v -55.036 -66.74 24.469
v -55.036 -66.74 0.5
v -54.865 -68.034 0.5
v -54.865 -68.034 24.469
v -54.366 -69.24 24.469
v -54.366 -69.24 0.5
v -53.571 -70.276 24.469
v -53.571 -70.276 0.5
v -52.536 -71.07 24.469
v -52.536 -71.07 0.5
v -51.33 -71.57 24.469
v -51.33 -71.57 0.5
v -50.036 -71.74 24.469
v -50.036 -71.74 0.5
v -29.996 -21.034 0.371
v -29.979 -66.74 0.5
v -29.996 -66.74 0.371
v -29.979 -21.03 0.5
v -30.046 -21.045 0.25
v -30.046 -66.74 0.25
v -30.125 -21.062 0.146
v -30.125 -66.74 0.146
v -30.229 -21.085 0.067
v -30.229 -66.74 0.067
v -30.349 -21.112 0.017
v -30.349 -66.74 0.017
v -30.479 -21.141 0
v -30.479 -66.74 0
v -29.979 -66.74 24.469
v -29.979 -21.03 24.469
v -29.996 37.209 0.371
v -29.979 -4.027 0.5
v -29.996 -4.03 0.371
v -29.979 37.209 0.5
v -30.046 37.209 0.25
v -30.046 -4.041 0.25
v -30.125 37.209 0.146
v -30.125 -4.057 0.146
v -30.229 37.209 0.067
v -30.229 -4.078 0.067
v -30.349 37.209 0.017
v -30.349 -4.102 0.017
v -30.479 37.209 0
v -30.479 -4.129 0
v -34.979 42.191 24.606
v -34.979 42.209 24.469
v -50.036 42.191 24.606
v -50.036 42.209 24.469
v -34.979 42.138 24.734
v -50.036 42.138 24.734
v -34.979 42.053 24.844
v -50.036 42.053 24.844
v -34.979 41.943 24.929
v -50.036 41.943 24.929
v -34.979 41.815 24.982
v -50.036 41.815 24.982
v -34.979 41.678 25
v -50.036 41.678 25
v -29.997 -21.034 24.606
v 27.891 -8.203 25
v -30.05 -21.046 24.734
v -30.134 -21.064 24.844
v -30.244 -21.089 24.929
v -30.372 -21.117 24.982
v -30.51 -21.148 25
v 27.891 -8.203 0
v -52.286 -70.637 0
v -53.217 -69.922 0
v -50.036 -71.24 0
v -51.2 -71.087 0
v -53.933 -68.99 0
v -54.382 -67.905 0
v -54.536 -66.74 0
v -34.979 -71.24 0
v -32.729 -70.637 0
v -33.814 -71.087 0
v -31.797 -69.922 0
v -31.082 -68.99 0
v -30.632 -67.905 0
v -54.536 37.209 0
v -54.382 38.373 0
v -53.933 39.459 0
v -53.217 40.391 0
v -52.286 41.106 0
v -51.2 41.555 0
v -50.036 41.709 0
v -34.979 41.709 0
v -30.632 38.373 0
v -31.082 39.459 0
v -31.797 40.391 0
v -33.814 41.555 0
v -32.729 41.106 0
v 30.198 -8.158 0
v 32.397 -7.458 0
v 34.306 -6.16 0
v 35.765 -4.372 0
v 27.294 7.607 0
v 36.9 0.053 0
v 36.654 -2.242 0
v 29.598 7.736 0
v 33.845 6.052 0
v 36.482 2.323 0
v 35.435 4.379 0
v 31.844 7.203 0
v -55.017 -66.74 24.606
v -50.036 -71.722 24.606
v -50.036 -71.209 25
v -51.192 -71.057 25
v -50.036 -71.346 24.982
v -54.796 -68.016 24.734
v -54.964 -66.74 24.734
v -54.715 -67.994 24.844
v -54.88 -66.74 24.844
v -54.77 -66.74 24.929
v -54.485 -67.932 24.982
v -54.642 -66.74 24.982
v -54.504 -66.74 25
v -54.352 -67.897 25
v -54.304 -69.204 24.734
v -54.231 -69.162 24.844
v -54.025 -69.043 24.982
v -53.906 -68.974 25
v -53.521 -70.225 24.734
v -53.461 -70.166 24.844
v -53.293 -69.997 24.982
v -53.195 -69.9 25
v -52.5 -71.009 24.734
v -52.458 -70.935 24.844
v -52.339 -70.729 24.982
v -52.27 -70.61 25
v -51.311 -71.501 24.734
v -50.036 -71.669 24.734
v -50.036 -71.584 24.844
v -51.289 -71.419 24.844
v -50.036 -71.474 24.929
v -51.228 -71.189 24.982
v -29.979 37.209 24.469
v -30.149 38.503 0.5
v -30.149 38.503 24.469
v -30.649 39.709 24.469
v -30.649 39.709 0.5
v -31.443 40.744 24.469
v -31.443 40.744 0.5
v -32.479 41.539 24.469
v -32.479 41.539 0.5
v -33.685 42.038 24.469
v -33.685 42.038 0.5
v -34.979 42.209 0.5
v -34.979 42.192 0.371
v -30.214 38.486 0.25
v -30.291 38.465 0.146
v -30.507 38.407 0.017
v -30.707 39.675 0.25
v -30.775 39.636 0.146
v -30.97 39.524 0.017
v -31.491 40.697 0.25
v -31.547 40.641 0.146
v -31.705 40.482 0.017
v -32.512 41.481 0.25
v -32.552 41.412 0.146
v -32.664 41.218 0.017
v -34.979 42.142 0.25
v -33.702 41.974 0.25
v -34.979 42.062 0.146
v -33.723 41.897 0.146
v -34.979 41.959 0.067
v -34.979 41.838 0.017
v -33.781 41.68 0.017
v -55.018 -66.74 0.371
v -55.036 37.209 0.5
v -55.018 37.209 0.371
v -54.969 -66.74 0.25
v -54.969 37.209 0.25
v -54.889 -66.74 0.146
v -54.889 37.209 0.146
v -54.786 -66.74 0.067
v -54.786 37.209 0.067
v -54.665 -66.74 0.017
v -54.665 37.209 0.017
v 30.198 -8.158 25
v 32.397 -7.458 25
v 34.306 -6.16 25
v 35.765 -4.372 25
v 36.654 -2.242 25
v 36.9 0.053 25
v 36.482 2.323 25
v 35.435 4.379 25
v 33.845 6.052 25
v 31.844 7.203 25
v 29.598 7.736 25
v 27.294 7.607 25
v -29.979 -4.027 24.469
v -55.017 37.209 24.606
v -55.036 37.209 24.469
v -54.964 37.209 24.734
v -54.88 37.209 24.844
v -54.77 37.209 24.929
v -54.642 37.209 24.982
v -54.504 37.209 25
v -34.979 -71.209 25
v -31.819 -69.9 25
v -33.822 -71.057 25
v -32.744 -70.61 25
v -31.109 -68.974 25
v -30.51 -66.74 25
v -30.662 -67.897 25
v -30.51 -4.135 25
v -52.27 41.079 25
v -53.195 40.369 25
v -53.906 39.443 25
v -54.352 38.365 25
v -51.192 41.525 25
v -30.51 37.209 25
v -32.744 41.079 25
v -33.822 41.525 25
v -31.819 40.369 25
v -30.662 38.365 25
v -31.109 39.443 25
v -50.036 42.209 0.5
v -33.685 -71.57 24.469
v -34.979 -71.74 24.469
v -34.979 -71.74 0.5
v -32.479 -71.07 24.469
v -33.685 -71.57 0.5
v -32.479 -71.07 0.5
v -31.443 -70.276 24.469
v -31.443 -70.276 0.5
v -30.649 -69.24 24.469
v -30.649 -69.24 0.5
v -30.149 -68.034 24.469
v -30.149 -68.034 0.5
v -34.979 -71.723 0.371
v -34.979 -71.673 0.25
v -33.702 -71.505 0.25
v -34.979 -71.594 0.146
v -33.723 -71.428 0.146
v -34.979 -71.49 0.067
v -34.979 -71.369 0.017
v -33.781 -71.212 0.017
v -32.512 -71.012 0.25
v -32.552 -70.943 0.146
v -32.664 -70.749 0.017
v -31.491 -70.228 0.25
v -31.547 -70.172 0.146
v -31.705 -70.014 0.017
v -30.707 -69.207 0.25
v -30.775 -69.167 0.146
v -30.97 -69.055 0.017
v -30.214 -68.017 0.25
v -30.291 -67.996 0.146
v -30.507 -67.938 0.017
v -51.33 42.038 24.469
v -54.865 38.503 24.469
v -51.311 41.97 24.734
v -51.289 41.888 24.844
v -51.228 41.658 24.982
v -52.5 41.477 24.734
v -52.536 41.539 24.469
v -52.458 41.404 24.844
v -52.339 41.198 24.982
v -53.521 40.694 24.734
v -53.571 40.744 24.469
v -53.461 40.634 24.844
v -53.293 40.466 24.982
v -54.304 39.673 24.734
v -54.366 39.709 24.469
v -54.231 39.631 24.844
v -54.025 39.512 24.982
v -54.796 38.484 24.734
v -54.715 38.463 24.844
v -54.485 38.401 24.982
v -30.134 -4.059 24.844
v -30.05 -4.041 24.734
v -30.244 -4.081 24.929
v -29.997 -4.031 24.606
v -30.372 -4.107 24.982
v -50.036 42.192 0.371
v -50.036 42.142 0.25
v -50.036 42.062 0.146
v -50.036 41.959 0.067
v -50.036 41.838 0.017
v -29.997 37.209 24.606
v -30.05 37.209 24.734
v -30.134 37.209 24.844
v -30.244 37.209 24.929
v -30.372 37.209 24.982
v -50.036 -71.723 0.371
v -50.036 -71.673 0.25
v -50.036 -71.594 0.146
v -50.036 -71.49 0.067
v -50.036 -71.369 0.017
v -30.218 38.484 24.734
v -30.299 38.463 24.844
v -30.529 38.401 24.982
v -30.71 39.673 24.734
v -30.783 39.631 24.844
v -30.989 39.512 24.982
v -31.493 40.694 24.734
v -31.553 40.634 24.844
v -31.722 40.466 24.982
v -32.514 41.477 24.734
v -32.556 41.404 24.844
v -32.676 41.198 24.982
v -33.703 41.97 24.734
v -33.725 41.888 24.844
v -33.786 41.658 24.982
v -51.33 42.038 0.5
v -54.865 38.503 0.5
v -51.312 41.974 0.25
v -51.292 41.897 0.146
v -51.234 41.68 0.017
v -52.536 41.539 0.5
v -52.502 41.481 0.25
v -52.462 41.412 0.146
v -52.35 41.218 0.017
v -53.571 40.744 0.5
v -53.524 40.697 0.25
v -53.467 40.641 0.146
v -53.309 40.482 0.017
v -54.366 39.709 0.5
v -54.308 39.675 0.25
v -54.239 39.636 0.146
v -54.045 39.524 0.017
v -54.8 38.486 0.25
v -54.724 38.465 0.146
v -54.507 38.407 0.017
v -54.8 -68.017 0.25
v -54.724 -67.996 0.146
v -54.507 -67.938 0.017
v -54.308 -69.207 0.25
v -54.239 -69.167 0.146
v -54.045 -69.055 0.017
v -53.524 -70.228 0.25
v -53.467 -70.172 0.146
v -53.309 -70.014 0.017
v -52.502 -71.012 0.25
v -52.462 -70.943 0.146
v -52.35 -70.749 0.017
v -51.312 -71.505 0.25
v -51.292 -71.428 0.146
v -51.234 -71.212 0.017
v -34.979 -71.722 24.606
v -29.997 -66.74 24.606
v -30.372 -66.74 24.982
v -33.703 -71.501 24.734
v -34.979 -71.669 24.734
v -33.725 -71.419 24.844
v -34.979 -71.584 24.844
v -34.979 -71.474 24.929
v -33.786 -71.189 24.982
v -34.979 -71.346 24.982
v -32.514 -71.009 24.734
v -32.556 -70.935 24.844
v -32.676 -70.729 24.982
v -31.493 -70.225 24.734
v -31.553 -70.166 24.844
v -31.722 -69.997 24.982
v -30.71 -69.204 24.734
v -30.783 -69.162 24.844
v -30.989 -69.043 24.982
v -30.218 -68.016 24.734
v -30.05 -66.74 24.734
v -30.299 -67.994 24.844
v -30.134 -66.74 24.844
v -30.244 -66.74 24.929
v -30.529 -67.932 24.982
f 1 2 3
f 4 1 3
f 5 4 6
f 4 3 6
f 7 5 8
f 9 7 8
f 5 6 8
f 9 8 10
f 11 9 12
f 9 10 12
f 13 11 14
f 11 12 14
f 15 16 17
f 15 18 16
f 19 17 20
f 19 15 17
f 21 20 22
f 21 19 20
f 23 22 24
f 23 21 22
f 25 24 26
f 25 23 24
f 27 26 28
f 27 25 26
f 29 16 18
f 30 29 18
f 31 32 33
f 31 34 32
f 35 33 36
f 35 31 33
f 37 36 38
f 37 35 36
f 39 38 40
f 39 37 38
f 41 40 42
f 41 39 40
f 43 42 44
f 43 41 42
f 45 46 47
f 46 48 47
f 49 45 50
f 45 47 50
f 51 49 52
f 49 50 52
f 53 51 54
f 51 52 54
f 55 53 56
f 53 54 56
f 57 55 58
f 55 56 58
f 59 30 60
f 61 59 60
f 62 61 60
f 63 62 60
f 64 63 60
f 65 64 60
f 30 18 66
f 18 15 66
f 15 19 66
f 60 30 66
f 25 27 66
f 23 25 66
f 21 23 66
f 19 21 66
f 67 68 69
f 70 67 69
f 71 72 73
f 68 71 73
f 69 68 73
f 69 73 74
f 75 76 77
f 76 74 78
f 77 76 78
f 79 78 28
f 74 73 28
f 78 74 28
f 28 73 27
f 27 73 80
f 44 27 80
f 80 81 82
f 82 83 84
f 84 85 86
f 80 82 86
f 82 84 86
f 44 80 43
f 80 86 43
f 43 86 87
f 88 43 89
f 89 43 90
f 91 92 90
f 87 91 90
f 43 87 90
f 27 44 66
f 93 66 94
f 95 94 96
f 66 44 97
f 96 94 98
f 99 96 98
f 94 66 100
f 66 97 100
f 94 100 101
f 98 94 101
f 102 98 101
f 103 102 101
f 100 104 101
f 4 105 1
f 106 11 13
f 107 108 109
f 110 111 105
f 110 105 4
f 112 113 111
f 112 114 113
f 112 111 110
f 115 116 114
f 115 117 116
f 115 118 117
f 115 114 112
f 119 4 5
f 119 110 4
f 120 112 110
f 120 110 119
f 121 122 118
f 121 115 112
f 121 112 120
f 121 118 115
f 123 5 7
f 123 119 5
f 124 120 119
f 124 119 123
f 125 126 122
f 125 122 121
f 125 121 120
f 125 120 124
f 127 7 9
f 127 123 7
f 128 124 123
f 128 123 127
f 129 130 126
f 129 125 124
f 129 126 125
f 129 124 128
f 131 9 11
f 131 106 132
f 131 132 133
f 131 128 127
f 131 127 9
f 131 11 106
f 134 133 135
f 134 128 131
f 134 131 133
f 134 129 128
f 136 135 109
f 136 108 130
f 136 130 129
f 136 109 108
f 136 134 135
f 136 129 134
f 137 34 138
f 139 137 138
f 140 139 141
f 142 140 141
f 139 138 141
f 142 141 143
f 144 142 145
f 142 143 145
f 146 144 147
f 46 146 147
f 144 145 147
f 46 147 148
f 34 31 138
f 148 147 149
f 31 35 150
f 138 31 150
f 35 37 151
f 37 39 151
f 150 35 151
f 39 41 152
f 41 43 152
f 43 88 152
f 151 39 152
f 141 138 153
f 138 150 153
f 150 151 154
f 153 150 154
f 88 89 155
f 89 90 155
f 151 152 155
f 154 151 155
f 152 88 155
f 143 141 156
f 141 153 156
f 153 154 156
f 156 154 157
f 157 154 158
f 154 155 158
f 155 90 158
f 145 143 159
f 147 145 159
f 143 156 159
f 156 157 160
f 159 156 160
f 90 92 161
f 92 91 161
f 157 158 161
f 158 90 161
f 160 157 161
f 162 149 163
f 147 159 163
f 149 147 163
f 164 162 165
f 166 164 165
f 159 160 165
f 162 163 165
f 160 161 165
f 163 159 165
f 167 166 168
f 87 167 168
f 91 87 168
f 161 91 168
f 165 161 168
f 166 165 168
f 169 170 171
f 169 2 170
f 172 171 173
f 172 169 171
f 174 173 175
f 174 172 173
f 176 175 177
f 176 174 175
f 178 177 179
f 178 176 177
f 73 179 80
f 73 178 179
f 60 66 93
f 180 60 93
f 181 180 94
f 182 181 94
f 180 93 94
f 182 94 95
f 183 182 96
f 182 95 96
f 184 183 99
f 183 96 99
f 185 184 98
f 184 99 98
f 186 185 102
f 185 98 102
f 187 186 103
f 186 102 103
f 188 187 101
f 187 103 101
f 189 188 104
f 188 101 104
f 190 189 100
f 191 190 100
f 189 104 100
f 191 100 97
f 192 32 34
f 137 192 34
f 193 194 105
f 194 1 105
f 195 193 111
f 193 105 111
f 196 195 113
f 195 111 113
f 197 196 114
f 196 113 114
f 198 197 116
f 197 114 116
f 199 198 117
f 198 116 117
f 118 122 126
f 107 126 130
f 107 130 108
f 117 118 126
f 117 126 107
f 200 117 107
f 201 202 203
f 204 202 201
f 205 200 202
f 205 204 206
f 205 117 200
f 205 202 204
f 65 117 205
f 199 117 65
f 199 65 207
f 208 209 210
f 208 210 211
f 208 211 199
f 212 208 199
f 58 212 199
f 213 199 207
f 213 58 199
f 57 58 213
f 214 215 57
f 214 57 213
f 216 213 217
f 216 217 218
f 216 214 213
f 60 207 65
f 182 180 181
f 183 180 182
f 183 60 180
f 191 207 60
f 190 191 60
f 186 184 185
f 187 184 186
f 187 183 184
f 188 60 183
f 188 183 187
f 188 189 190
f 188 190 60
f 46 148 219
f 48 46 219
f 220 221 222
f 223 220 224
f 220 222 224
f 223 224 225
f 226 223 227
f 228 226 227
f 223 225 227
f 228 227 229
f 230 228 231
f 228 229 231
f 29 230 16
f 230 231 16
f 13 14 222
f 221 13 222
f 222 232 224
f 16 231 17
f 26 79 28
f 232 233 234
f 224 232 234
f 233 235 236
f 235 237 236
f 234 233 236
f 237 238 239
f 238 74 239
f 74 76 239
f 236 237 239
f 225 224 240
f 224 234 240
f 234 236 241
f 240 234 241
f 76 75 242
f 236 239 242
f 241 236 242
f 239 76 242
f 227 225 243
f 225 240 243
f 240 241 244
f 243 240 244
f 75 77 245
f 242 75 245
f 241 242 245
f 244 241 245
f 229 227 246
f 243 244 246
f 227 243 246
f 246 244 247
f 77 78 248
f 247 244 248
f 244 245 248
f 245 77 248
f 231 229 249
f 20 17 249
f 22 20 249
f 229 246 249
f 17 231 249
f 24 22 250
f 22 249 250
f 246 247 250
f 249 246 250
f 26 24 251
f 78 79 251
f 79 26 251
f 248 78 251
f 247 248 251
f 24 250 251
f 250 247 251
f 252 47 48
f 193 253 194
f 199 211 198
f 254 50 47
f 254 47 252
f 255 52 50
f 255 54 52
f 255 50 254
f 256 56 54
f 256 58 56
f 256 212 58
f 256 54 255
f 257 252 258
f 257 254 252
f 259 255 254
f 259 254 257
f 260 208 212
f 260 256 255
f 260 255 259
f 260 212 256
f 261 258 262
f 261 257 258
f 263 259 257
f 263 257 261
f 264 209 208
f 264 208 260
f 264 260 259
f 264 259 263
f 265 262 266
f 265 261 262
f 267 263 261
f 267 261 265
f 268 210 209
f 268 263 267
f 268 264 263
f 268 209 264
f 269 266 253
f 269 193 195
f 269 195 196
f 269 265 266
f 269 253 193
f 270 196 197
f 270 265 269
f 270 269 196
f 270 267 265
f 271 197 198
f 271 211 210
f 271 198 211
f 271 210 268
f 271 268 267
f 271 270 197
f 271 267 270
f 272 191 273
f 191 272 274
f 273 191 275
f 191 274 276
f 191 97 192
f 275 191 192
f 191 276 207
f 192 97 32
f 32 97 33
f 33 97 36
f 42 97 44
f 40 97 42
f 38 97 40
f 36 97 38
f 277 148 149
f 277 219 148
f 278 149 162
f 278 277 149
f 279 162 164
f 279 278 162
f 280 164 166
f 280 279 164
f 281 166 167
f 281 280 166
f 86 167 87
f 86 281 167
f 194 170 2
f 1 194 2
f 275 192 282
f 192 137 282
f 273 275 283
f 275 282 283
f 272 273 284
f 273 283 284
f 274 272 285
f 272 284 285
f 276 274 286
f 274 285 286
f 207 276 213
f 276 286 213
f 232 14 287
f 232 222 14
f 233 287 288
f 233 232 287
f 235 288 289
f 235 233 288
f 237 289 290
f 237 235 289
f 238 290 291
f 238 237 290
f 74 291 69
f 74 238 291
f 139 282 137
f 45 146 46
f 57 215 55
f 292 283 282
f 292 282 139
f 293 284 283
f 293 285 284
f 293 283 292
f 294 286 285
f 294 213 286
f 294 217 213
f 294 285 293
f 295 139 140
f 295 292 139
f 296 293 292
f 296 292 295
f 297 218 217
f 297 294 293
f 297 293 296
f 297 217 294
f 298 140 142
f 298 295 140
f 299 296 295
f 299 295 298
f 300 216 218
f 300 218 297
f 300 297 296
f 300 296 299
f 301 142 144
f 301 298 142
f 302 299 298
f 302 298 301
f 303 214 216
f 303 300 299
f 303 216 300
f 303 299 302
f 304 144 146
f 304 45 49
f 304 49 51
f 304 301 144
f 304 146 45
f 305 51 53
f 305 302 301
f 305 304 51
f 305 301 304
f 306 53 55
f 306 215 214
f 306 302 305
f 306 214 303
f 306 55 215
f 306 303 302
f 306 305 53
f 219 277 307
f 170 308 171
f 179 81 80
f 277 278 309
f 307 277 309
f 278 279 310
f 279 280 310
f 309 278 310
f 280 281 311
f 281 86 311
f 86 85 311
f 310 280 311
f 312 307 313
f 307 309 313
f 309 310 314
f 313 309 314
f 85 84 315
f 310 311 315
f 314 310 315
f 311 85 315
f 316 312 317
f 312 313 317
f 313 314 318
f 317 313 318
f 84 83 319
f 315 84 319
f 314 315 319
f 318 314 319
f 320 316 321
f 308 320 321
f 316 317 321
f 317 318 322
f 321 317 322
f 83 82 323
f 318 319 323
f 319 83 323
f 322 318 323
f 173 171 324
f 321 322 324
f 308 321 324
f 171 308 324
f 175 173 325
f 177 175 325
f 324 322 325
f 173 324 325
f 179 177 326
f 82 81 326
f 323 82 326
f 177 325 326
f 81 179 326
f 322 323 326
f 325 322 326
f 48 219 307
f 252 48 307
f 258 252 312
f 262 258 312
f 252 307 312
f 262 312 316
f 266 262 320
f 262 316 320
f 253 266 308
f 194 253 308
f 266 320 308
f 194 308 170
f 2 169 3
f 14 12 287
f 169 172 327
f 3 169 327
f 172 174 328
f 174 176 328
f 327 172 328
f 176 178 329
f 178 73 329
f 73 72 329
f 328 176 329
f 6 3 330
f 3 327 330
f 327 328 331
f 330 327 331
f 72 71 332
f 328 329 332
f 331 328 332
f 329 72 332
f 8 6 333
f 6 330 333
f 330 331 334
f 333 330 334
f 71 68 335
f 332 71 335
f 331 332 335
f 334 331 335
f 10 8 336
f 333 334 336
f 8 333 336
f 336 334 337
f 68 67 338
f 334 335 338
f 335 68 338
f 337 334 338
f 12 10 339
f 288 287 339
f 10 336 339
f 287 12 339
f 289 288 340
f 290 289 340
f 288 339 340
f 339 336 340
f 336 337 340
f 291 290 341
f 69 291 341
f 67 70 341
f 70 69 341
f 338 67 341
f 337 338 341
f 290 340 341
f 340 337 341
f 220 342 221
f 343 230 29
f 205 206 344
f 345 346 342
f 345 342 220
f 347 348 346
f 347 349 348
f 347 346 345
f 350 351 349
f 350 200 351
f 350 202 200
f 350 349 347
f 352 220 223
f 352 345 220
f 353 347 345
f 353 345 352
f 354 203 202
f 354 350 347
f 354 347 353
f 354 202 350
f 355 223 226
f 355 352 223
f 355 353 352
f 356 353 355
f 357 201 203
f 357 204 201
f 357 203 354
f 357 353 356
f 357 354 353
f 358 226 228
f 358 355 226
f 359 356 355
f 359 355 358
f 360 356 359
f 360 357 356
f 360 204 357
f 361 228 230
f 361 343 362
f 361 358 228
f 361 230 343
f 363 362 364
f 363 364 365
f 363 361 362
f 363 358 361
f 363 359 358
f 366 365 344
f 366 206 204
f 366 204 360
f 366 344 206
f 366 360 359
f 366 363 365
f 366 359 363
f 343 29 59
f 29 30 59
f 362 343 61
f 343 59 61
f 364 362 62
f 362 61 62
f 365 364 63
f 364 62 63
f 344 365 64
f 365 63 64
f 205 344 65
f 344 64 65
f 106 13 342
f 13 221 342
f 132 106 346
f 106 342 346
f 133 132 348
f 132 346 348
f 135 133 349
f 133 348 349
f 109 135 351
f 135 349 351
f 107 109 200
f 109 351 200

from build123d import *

# Parameters (mm, degrees)
F1_DEPTH = 25
F4_R     = 0.5311269837
F5_R     = 0.5


# Not quite as in the source:
# - the program builds the solid bodies; features that only make, move or delete a surface that nothing else refers to are left out


with BuildPart() as f1:
    # F0 (on Top) → F1 (new body)
    with BuildSketch(Plane.XY):
        with BuildLine():
            Line((27.2940341383, 7.6065342873), (-29.9786943942, -4.0269889869))
            Line((-29.9786943942, -4.0269889869), (-29.9786943942, -21.0298318416))
            Line((-29.9786943942, -21.0298318416), (27.8906263411, -8.2031255588))
            ThreePointArc((27.8906263411, -8.2031255588), (36.9003542168, 0.052951297), (27.2940341383, 7.6065342873))
        make_face()
        with BuildLine():
            Line((-34.9786943942, 42.2088094056), (-50.0355128944, 42.2088094056))
            ThreePointArc((-50.0355128944, 42.2088094056), (-53.5710468003, 40.7443433115), (-55.0355128944, 37.2088094056))
            Line((-55.0355128944, 37.2088094056), (-55.0355128944, -66.7400610447))
            ThreePointArc((-55.0355128944, -66.7400610447), (-53.5710468003, -70.2755949506), (-50.0355128944, -71.7400610447))
            Line((-50.0355128944, -71.7400610447), (-34.9786943942, -71.7400610447))
            ThreePointArc((-34.9786943942, -71.7400610447), (-31.4431604883, -70.2755949506), (-29.9786943942, -66.7400610447))
            Line((-29.9786943942, -66.7400610447), (-29.9786943942, -21.0298318416))
            Line((-29.9786943942, -21.0298318416), (-29.9786943942, -4.0269889869))
            Line((-29.9786943942, -4.0269889869), (-29.9786943942, 37.2088094056))
            ThreePointArc((-29.9786943942, 37.2088094056), (-31.4431604883, 40.7443433115), (-34.9786943942, 42.2088094056))
        make_face()
    extrude(amount=F1_DEPTH)

    # F4
    f4_edges = [f1.edges().sort_by_distance(p)[0] for p in [
        (-29.978694, -43.884946, 25),
    ]]
    fillet(f4_edges, radius=F4_R)

    # F5
    f5_edges = [f1.edges().sort_by_distance(p)[0] for p in [
        (-29.978694, -43.884946, 0),
    ]]
    fillet(f5_edges, radius=F5_R)


solid = f1.part
